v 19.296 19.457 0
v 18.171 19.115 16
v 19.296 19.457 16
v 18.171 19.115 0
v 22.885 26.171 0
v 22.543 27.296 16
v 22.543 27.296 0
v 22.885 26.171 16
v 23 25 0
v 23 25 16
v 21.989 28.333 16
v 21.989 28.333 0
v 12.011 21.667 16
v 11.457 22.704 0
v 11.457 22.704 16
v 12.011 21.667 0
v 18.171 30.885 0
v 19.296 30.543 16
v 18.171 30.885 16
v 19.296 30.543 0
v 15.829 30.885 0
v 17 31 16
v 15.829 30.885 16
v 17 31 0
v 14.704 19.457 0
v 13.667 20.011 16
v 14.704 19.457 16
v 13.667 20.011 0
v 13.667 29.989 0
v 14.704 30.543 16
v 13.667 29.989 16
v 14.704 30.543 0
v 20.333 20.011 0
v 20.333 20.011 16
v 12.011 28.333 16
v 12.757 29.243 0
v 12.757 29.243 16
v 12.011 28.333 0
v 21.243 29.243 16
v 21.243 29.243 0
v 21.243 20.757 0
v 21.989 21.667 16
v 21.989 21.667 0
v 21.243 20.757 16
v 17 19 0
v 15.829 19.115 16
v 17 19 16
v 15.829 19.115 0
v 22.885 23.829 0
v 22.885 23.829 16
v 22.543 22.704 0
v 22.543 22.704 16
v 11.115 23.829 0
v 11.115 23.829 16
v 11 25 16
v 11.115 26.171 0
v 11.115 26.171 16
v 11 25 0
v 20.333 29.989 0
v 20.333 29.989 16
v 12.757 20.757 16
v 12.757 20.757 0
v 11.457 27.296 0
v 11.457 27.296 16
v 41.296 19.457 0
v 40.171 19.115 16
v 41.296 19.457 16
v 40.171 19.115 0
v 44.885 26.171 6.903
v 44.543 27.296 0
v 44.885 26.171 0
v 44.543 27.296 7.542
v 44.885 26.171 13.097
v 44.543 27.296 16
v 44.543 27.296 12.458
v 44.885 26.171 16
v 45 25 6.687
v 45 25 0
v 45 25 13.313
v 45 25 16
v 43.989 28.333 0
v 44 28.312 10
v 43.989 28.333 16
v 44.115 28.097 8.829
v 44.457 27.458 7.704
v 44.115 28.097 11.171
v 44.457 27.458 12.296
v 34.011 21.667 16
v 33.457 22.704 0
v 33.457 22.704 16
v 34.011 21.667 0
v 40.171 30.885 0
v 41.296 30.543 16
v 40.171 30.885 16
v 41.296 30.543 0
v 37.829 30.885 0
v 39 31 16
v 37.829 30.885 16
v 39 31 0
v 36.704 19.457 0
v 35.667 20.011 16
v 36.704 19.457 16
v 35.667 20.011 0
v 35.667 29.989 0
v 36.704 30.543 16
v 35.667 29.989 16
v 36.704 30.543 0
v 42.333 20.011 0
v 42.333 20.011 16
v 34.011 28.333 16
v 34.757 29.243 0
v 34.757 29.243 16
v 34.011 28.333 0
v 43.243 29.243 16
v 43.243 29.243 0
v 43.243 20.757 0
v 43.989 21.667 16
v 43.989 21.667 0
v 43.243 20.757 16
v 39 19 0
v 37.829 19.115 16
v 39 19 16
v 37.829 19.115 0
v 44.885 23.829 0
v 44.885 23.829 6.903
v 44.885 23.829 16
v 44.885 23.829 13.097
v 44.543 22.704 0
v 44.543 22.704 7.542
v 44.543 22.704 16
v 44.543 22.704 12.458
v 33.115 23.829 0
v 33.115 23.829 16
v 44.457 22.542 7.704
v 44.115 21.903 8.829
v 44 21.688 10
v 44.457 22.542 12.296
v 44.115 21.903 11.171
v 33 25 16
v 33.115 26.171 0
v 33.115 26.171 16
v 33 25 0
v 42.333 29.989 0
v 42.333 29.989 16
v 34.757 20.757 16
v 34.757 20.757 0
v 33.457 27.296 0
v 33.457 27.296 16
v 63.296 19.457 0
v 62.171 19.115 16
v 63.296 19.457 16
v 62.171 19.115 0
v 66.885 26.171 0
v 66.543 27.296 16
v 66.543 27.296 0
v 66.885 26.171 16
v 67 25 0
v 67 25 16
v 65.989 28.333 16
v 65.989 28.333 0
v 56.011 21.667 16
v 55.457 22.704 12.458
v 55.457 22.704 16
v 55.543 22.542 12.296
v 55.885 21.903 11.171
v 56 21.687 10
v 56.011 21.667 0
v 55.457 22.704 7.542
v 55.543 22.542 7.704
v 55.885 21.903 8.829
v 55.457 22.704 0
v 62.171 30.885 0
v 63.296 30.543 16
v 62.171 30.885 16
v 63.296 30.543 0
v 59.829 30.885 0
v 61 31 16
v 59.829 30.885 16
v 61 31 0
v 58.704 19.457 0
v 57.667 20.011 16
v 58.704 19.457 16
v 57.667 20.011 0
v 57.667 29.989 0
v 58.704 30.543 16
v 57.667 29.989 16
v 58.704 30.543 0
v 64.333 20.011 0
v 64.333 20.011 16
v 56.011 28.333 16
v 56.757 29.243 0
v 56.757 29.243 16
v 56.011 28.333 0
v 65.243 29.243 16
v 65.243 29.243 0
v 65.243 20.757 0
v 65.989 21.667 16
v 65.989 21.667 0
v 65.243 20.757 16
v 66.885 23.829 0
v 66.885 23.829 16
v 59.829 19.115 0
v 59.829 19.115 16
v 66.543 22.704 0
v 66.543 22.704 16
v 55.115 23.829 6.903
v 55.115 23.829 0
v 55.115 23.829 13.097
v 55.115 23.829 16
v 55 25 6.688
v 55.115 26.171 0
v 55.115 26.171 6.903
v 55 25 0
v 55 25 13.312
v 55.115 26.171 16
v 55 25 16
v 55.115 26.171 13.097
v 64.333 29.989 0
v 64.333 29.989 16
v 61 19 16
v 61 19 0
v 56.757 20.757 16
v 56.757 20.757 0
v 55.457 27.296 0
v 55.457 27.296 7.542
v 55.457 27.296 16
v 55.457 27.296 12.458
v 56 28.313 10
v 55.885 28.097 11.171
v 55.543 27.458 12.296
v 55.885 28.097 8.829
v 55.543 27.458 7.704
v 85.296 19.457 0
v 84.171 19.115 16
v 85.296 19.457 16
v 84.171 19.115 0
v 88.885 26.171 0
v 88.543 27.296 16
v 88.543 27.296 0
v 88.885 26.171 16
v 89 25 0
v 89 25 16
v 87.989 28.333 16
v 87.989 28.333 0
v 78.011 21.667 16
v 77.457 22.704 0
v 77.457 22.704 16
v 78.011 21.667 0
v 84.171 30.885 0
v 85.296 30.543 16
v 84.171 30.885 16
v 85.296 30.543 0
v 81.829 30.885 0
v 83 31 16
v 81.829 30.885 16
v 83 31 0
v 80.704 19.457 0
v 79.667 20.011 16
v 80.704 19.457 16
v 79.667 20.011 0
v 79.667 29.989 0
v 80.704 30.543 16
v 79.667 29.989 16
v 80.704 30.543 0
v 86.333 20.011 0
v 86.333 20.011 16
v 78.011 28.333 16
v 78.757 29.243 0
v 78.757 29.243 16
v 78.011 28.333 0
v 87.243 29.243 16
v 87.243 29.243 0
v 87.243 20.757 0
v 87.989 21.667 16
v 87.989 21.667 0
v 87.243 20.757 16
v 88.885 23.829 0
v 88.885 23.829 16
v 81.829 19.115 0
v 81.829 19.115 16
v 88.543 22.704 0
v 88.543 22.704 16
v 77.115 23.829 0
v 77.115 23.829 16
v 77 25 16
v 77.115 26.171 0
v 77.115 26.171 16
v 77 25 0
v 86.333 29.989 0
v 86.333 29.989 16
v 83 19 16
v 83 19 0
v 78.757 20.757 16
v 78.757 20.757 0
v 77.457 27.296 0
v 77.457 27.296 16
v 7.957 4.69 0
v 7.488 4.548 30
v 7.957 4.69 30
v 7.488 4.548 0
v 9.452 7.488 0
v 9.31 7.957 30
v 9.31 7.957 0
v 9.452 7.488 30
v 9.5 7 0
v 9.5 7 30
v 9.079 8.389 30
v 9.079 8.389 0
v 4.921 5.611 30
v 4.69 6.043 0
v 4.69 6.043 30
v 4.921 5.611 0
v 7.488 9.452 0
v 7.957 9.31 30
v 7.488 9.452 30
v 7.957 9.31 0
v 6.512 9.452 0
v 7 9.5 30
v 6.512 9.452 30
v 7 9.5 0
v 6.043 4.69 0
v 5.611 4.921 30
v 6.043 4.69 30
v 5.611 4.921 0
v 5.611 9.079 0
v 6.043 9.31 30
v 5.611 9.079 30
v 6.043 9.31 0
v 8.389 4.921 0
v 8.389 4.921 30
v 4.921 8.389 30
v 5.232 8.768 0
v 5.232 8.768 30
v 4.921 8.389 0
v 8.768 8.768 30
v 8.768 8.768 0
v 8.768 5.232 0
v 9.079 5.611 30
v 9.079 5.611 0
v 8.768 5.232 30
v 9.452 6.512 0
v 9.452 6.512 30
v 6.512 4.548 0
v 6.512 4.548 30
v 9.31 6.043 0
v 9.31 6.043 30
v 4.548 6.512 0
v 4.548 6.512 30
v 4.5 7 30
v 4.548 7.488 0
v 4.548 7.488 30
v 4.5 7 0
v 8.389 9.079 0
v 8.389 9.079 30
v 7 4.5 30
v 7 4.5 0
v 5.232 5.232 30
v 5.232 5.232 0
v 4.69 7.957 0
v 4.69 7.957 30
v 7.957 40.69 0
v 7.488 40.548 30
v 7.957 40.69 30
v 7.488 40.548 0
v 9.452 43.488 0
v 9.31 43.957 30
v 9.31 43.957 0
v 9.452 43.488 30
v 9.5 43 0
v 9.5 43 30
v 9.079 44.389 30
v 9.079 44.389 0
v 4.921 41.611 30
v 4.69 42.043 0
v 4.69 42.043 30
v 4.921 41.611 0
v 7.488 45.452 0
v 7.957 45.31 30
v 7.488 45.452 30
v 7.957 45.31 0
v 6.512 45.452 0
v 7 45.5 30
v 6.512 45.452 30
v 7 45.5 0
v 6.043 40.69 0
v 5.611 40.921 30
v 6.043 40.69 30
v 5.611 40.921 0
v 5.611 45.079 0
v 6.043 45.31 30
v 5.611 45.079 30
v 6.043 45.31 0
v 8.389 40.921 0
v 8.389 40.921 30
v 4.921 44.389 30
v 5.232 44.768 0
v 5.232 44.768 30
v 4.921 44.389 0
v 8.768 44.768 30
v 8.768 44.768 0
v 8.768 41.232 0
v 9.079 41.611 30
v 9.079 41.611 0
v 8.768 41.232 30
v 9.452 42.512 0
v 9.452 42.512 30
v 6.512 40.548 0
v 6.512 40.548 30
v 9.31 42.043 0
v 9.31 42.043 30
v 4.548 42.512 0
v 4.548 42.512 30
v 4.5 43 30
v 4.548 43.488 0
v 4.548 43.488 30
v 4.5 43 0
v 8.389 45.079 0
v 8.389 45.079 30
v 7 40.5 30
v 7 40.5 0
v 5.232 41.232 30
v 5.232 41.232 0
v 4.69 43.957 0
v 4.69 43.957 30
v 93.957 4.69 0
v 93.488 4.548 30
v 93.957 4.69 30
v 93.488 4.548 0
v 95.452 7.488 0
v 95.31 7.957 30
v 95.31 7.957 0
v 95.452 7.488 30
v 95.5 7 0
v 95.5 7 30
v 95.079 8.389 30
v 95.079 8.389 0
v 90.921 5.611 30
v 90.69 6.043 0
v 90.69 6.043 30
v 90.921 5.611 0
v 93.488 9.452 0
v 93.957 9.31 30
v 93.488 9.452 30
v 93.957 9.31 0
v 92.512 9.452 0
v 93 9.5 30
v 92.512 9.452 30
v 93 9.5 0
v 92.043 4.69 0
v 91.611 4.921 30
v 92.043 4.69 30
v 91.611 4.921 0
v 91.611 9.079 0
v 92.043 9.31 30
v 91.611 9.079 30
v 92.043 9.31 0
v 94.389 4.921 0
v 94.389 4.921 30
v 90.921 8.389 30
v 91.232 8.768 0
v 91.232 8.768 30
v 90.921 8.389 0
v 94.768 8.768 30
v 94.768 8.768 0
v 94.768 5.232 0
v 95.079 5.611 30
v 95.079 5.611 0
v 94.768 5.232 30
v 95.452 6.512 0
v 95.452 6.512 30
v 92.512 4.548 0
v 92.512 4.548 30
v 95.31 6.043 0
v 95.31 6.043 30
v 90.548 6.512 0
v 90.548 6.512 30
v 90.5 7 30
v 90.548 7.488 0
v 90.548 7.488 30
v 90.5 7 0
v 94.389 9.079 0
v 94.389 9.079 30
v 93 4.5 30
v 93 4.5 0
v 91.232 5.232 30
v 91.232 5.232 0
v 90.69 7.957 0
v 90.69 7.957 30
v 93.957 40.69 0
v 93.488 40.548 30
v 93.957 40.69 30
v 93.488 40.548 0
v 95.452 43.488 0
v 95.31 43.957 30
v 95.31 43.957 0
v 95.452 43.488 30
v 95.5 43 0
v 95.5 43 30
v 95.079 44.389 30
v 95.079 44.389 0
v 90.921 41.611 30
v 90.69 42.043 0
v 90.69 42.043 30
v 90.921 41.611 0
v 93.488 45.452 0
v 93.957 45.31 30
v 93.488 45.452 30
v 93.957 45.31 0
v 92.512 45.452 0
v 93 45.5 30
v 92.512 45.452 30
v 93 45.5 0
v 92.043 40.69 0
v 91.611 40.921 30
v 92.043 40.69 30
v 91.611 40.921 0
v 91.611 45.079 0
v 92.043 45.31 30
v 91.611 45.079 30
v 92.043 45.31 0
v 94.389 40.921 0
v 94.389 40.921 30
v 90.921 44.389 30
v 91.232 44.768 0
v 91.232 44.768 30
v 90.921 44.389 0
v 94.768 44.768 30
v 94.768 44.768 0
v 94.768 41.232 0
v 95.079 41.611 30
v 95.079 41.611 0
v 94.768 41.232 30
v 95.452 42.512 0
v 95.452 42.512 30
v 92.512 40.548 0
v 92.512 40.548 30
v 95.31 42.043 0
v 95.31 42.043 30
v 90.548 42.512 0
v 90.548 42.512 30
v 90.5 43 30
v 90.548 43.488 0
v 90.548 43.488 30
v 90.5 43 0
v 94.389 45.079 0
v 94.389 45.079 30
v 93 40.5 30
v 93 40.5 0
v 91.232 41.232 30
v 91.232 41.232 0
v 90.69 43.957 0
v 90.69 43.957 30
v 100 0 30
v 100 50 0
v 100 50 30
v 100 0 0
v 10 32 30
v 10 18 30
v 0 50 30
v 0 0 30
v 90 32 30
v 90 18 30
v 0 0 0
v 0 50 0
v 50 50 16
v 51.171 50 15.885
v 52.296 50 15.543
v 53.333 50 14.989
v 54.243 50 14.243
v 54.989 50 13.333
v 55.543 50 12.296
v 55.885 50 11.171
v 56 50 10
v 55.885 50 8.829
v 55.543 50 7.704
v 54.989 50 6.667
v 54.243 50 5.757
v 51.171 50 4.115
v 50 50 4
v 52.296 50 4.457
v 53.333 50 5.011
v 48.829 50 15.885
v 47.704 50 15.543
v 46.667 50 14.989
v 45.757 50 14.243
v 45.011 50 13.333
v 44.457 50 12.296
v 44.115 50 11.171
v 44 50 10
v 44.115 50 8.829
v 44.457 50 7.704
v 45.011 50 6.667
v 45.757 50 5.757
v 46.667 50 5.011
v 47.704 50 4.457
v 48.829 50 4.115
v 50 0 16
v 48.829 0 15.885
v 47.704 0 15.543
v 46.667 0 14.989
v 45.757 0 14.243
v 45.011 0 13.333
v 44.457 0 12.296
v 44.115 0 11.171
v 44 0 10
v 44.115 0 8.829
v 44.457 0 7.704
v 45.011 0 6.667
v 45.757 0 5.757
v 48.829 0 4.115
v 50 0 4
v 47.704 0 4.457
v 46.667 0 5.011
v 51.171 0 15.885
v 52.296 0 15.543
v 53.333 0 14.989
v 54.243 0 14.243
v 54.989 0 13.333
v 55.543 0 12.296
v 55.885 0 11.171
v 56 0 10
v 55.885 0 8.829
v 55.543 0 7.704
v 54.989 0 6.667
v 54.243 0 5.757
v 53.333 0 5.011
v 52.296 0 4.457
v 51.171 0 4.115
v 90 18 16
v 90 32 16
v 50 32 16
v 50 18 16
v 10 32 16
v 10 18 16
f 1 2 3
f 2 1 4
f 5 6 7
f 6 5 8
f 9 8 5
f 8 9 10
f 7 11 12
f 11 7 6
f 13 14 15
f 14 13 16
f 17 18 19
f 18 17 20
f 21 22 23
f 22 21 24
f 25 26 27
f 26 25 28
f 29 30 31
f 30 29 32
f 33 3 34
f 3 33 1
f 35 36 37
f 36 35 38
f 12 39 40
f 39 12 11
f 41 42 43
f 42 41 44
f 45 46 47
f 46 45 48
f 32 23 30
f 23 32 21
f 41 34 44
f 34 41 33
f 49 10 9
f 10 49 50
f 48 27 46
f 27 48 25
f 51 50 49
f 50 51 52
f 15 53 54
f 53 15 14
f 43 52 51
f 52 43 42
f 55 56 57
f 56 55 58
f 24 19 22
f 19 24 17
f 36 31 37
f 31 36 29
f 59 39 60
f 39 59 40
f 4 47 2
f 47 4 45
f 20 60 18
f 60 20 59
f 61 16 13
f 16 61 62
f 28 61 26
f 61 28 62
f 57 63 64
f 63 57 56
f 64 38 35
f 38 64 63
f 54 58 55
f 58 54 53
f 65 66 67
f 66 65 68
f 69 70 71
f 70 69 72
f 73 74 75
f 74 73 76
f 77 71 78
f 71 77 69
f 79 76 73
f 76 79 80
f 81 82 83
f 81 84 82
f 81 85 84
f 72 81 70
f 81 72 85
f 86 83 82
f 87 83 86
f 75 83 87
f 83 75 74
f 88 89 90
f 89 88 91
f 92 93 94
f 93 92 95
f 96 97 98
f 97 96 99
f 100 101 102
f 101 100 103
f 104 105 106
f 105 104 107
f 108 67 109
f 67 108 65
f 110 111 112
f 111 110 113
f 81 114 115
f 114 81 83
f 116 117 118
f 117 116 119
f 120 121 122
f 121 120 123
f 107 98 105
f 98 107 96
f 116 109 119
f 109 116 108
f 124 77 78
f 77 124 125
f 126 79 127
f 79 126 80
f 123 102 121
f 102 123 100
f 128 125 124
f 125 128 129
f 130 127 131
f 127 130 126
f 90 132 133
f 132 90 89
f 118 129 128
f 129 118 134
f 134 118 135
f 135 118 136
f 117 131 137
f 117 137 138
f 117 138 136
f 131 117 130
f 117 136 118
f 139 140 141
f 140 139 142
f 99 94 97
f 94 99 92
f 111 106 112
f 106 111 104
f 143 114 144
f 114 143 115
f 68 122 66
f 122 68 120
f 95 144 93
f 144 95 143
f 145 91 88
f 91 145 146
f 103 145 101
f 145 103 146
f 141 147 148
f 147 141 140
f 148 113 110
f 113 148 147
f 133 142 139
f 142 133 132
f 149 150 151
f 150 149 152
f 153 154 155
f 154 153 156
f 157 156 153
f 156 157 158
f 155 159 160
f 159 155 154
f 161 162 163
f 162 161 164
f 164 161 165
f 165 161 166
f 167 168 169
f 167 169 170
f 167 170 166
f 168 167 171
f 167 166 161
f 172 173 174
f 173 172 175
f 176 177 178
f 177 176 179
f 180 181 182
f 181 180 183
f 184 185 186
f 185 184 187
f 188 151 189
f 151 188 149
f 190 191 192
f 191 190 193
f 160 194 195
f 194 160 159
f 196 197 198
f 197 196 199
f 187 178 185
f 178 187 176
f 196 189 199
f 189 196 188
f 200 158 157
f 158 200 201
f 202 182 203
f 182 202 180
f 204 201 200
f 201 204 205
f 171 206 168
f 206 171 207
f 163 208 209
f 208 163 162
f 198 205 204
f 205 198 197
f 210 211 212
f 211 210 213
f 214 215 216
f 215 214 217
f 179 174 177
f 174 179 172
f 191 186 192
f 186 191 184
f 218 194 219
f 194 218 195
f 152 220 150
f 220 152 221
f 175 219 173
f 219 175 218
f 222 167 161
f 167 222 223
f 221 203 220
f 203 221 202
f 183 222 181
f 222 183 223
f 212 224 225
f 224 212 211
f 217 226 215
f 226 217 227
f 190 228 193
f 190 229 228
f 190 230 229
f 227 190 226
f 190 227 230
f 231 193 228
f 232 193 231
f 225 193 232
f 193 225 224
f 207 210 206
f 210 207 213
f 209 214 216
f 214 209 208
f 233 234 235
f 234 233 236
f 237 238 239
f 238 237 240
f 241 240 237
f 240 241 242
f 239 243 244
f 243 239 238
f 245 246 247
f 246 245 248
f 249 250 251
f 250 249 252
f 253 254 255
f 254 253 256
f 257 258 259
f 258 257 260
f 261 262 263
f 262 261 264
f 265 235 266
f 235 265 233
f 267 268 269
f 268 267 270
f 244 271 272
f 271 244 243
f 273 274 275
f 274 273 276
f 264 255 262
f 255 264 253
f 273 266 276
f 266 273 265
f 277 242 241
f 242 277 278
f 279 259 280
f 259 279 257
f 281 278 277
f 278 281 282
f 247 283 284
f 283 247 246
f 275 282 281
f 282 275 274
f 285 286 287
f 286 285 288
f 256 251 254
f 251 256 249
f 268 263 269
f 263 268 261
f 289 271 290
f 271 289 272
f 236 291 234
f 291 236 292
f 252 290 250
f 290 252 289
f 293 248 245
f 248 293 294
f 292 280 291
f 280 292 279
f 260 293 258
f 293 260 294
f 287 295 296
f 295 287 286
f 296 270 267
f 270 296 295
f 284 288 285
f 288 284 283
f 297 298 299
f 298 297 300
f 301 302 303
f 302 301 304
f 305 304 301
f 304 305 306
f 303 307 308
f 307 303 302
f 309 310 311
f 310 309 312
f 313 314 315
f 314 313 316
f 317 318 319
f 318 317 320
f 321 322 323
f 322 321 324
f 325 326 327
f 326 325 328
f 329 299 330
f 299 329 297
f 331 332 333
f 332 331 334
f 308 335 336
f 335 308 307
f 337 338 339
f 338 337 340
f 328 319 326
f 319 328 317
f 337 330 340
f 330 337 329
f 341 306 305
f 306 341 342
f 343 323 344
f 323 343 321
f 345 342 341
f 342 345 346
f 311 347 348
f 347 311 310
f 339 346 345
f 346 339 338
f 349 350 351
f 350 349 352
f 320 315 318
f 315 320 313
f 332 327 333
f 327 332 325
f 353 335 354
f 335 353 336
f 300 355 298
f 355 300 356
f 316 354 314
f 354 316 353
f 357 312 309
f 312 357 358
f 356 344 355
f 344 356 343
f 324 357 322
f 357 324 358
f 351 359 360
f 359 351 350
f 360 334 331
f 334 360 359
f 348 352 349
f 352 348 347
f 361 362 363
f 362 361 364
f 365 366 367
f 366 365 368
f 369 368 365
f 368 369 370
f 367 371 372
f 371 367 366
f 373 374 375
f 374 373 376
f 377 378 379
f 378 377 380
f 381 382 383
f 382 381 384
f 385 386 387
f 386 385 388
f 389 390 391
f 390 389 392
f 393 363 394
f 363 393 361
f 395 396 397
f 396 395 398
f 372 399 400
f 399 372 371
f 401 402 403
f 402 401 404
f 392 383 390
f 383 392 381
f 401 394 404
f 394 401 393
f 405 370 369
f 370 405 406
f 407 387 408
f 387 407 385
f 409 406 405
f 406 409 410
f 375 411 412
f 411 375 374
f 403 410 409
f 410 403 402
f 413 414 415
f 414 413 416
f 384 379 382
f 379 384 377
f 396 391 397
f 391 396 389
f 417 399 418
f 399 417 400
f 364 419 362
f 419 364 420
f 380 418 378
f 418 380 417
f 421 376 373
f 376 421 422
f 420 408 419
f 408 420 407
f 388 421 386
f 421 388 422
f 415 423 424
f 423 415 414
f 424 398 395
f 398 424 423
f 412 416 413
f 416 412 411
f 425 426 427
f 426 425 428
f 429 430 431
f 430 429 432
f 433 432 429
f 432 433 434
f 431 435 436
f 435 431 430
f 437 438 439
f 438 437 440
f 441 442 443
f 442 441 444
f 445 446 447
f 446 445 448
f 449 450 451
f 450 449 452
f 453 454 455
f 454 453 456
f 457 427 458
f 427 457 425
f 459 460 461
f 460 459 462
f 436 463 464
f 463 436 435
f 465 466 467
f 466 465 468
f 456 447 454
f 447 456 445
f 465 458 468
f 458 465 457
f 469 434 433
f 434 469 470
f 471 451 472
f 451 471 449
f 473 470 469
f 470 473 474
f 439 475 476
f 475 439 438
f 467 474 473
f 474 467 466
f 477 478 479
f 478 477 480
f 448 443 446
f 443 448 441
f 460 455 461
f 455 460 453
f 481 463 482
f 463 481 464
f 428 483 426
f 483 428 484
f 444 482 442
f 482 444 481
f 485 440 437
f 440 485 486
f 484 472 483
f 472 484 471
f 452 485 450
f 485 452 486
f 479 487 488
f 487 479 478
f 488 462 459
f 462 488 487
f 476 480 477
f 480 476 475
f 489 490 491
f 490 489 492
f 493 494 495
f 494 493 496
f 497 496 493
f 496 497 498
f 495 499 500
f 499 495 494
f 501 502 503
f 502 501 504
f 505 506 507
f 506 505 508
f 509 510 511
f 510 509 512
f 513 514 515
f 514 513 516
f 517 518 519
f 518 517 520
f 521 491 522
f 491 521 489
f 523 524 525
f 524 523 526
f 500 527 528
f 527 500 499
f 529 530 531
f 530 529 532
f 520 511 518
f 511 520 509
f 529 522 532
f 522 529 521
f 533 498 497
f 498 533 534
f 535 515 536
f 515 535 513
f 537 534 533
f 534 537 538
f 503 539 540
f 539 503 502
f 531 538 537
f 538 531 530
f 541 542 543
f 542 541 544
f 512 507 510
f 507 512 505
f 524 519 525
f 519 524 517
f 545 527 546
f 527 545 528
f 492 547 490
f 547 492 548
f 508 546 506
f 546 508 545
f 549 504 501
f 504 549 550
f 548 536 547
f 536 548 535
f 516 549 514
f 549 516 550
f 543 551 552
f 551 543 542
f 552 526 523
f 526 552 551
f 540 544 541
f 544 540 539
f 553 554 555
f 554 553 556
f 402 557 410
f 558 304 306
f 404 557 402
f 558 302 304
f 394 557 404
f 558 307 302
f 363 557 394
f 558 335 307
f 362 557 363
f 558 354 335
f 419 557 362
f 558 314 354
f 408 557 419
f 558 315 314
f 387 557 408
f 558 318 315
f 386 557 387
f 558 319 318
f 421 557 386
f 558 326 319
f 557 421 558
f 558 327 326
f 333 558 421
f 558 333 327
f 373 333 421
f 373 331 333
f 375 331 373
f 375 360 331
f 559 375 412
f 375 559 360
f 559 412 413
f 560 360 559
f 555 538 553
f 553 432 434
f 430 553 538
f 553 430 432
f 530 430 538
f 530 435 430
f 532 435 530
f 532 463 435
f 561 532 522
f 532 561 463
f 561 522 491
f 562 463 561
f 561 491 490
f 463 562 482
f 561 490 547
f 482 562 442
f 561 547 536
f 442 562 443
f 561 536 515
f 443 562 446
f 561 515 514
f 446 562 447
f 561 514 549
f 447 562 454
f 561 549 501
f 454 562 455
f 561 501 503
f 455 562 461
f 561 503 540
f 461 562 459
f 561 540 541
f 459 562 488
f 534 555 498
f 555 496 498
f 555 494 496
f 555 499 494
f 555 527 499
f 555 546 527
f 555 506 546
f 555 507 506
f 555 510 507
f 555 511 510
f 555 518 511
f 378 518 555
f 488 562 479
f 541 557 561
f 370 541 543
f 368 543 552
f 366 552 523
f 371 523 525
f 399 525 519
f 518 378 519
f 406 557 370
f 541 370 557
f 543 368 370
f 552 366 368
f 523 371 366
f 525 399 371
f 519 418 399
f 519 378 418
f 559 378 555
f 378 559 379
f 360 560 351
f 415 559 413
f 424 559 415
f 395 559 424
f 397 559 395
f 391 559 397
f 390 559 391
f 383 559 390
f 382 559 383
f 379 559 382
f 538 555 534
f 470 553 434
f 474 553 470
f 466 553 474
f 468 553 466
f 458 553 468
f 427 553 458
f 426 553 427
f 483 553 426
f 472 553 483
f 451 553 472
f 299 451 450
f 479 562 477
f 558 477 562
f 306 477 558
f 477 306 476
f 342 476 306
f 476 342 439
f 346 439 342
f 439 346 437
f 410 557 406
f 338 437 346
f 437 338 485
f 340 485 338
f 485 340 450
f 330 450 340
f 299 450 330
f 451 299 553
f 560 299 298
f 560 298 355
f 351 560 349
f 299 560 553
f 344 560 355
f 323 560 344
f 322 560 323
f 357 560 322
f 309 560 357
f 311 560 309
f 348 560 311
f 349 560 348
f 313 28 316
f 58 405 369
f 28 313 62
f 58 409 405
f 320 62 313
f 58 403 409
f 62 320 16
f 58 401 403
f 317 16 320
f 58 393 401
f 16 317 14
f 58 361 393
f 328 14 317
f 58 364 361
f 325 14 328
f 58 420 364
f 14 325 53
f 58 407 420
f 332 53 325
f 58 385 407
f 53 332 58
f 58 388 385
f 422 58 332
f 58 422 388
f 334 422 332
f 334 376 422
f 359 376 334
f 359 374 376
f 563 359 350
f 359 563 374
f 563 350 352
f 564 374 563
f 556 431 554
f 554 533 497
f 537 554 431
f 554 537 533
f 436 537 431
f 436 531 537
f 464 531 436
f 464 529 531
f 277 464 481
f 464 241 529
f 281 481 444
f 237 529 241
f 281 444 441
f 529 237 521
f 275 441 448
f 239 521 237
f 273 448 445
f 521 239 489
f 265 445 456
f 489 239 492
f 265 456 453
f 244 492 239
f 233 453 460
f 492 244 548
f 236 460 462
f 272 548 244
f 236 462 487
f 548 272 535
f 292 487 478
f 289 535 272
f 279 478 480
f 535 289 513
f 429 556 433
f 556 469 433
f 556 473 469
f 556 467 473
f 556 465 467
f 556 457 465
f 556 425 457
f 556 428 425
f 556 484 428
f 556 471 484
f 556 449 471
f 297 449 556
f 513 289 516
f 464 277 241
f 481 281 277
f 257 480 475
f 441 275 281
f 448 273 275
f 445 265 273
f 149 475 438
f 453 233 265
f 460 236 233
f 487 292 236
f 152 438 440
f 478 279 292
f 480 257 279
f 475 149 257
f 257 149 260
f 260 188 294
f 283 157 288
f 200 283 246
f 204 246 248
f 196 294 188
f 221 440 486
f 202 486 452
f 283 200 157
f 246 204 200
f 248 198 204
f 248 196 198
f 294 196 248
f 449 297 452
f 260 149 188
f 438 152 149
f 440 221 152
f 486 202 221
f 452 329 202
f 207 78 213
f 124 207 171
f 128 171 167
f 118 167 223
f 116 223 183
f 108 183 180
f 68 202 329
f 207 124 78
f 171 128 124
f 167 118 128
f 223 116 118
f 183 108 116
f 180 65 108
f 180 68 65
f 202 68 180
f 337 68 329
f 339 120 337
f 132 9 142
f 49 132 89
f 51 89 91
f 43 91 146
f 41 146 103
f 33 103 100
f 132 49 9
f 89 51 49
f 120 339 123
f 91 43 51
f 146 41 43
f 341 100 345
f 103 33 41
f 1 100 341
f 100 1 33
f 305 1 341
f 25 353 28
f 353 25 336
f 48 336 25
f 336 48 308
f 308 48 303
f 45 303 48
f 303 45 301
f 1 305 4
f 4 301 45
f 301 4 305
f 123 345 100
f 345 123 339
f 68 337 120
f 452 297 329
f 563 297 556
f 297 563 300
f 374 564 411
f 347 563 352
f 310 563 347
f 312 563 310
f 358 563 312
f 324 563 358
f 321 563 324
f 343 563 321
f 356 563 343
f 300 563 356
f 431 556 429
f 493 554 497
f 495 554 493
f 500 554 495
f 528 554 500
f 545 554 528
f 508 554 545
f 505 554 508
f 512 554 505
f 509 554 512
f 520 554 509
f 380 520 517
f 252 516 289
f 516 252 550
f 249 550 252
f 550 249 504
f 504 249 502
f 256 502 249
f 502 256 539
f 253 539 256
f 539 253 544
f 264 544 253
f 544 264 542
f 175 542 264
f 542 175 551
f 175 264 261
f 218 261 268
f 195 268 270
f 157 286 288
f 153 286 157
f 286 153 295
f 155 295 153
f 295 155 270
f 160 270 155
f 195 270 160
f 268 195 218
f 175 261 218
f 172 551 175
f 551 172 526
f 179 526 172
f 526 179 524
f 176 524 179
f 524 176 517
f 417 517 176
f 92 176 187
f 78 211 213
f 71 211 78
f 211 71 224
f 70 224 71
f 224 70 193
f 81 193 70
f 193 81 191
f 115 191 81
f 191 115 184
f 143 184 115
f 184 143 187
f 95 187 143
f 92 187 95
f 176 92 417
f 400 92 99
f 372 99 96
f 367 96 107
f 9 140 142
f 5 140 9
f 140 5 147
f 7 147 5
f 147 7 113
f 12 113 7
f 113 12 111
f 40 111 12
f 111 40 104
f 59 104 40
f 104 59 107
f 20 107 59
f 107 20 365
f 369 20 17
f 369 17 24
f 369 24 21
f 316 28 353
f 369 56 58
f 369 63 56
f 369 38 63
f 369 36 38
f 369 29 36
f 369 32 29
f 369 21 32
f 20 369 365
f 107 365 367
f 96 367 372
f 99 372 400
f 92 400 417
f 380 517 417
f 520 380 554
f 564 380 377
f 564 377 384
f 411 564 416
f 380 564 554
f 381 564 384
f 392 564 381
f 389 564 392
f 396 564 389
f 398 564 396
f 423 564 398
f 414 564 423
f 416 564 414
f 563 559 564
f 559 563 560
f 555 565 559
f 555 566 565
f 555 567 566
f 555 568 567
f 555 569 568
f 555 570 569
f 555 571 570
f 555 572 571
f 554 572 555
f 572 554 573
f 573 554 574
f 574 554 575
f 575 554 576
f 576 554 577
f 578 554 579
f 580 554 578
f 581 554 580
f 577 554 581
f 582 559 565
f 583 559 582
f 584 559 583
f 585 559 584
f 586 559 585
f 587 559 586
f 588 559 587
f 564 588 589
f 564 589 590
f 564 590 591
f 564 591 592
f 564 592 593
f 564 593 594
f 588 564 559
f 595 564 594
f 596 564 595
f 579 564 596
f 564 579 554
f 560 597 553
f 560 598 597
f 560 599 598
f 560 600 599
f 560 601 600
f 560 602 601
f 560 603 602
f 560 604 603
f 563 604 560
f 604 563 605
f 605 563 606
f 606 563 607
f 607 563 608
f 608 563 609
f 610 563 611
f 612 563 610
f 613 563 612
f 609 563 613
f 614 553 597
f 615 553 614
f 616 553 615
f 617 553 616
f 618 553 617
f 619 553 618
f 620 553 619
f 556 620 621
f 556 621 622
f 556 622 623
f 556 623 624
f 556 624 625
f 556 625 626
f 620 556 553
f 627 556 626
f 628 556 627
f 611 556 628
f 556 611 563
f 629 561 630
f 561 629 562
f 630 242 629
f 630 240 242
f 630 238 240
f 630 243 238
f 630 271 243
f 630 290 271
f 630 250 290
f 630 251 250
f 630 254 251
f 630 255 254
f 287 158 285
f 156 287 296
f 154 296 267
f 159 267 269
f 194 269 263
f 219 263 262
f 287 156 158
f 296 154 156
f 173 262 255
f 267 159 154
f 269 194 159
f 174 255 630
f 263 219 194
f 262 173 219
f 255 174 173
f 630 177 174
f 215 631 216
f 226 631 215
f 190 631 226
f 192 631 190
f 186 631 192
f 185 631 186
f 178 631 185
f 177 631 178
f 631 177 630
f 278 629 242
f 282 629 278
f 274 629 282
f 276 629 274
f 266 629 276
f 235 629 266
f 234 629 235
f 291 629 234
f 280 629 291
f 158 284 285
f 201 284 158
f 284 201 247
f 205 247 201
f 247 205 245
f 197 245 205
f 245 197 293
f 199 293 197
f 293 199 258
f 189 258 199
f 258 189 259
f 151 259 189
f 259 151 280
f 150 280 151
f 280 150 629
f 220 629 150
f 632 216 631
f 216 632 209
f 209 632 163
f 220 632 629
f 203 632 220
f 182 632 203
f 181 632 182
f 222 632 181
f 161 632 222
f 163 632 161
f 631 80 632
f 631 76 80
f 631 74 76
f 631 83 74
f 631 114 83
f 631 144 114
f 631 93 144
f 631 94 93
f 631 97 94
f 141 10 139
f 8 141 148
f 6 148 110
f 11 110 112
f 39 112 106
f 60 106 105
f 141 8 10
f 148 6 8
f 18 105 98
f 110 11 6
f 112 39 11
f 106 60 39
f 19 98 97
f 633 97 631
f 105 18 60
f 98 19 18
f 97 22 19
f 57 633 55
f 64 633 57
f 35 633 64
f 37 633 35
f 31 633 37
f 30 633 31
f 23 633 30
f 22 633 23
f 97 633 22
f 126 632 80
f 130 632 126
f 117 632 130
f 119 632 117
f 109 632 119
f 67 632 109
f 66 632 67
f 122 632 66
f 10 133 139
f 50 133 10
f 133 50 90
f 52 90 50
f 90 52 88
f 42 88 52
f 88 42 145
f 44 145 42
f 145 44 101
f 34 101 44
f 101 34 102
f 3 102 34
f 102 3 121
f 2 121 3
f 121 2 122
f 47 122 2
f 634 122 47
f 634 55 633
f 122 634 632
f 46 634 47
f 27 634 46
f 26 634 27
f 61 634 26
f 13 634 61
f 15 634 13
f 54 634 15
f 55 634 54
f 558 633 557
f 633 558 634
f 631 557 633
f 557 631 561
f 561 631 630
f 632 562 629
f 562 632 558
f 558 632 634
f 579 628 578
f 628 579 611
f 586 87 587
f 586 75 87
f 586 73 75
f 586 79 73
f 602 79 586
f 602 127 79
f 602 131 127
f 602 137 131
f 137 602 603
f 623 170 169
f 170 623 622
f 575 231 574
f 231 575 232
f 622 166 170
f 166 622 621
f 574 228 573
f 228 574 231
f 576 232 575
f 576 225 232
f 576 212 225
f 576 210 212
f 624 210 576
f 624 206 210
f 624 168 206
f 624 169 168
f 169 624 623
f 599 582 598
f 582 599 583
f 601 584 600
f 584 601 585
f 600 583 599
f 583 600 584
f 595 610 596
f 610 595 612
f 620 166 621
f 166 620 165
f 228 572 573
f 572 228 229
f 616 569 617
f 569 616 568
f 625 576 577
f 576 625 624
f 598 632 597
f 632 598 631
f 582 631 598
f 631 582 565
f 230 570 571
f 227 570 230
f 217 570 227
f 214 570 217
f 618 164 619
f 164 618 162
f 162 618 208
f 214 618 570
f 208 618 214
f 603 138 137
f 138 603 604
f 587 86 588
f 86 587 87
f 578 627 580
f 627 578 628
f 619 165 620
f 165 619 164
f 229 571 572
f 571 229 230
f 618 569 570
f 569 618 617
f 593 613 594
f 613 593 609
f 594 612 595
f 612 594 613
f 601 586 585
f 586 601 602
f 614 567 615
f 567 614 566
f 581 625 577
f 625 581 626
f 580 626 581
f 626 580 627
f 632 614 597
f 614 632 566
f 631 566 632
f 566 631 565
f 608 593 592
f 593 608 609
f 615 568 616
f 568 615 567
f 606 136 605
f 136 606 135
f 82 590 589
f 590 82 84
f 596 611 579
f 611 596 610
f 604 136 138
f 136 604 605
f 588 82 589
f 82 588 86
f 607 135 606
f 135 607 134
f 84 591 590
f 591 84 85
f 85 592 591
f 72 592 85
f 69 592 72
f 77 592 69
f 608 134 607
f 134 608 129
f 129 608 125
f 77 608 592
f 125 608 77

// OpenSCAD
$fn = 32;

// ----------------------------------------------------------------------
// Manifold block: side_outlet manifold
// ----------------------------------------------------------------------

// --- parameters (mm) ---
block_l = 100;            // block length, X
block_w = 50;             // block width, Y
block_h = 30;             // block height, Z
port_d = 12;              // port bore diameter
port_pitch = 22;          // port pitch along X
gallery_d = 14;           // top gallery width, Y
gallery_depth = 14;       // gallery pocket depth
wall_p = 10;              // gallery end wall thickness, X
mnt_d = 5;                // mounting hole diameter
mnt_in = 7;               // mounting hole inset from the edges
out_d = 12;               // outlet bore diameter
out_z = 10;               // outlet axis height

n_ports = 4;  // ports in the row
port_x0 = (block_l - (n_ports - 1) * port_pitch) / 2;  // first port X

difference() {
  cube([block_l, block_w, block_h]);
  for (i = [0 : n_ports - 1])
    translate([port_x0 + i * port_pitch, block_w / 2, -1])
      cylinder(h = block_h + 2, d = port_d);
  translate([wall_p, block_w / 2 - gallery_d / 2, block_h - gallery_depth])
    cube([block_l - 2 * wall_p, gallery_d, gallery_depth + 1]);
  for (cx = [mnt_in, block_l - mnt_in])
    for (cy = [mnt_in, block_w - mnt_in])
      translate([cx, cy, -1]) cylinder(h = block_h + 2, d = mnt_d);
  translate([block_l / 2, -1, out_z]) rotate([-90, 0, 0])
    cylinder(h = block_w + 2, d = out_d);
}
